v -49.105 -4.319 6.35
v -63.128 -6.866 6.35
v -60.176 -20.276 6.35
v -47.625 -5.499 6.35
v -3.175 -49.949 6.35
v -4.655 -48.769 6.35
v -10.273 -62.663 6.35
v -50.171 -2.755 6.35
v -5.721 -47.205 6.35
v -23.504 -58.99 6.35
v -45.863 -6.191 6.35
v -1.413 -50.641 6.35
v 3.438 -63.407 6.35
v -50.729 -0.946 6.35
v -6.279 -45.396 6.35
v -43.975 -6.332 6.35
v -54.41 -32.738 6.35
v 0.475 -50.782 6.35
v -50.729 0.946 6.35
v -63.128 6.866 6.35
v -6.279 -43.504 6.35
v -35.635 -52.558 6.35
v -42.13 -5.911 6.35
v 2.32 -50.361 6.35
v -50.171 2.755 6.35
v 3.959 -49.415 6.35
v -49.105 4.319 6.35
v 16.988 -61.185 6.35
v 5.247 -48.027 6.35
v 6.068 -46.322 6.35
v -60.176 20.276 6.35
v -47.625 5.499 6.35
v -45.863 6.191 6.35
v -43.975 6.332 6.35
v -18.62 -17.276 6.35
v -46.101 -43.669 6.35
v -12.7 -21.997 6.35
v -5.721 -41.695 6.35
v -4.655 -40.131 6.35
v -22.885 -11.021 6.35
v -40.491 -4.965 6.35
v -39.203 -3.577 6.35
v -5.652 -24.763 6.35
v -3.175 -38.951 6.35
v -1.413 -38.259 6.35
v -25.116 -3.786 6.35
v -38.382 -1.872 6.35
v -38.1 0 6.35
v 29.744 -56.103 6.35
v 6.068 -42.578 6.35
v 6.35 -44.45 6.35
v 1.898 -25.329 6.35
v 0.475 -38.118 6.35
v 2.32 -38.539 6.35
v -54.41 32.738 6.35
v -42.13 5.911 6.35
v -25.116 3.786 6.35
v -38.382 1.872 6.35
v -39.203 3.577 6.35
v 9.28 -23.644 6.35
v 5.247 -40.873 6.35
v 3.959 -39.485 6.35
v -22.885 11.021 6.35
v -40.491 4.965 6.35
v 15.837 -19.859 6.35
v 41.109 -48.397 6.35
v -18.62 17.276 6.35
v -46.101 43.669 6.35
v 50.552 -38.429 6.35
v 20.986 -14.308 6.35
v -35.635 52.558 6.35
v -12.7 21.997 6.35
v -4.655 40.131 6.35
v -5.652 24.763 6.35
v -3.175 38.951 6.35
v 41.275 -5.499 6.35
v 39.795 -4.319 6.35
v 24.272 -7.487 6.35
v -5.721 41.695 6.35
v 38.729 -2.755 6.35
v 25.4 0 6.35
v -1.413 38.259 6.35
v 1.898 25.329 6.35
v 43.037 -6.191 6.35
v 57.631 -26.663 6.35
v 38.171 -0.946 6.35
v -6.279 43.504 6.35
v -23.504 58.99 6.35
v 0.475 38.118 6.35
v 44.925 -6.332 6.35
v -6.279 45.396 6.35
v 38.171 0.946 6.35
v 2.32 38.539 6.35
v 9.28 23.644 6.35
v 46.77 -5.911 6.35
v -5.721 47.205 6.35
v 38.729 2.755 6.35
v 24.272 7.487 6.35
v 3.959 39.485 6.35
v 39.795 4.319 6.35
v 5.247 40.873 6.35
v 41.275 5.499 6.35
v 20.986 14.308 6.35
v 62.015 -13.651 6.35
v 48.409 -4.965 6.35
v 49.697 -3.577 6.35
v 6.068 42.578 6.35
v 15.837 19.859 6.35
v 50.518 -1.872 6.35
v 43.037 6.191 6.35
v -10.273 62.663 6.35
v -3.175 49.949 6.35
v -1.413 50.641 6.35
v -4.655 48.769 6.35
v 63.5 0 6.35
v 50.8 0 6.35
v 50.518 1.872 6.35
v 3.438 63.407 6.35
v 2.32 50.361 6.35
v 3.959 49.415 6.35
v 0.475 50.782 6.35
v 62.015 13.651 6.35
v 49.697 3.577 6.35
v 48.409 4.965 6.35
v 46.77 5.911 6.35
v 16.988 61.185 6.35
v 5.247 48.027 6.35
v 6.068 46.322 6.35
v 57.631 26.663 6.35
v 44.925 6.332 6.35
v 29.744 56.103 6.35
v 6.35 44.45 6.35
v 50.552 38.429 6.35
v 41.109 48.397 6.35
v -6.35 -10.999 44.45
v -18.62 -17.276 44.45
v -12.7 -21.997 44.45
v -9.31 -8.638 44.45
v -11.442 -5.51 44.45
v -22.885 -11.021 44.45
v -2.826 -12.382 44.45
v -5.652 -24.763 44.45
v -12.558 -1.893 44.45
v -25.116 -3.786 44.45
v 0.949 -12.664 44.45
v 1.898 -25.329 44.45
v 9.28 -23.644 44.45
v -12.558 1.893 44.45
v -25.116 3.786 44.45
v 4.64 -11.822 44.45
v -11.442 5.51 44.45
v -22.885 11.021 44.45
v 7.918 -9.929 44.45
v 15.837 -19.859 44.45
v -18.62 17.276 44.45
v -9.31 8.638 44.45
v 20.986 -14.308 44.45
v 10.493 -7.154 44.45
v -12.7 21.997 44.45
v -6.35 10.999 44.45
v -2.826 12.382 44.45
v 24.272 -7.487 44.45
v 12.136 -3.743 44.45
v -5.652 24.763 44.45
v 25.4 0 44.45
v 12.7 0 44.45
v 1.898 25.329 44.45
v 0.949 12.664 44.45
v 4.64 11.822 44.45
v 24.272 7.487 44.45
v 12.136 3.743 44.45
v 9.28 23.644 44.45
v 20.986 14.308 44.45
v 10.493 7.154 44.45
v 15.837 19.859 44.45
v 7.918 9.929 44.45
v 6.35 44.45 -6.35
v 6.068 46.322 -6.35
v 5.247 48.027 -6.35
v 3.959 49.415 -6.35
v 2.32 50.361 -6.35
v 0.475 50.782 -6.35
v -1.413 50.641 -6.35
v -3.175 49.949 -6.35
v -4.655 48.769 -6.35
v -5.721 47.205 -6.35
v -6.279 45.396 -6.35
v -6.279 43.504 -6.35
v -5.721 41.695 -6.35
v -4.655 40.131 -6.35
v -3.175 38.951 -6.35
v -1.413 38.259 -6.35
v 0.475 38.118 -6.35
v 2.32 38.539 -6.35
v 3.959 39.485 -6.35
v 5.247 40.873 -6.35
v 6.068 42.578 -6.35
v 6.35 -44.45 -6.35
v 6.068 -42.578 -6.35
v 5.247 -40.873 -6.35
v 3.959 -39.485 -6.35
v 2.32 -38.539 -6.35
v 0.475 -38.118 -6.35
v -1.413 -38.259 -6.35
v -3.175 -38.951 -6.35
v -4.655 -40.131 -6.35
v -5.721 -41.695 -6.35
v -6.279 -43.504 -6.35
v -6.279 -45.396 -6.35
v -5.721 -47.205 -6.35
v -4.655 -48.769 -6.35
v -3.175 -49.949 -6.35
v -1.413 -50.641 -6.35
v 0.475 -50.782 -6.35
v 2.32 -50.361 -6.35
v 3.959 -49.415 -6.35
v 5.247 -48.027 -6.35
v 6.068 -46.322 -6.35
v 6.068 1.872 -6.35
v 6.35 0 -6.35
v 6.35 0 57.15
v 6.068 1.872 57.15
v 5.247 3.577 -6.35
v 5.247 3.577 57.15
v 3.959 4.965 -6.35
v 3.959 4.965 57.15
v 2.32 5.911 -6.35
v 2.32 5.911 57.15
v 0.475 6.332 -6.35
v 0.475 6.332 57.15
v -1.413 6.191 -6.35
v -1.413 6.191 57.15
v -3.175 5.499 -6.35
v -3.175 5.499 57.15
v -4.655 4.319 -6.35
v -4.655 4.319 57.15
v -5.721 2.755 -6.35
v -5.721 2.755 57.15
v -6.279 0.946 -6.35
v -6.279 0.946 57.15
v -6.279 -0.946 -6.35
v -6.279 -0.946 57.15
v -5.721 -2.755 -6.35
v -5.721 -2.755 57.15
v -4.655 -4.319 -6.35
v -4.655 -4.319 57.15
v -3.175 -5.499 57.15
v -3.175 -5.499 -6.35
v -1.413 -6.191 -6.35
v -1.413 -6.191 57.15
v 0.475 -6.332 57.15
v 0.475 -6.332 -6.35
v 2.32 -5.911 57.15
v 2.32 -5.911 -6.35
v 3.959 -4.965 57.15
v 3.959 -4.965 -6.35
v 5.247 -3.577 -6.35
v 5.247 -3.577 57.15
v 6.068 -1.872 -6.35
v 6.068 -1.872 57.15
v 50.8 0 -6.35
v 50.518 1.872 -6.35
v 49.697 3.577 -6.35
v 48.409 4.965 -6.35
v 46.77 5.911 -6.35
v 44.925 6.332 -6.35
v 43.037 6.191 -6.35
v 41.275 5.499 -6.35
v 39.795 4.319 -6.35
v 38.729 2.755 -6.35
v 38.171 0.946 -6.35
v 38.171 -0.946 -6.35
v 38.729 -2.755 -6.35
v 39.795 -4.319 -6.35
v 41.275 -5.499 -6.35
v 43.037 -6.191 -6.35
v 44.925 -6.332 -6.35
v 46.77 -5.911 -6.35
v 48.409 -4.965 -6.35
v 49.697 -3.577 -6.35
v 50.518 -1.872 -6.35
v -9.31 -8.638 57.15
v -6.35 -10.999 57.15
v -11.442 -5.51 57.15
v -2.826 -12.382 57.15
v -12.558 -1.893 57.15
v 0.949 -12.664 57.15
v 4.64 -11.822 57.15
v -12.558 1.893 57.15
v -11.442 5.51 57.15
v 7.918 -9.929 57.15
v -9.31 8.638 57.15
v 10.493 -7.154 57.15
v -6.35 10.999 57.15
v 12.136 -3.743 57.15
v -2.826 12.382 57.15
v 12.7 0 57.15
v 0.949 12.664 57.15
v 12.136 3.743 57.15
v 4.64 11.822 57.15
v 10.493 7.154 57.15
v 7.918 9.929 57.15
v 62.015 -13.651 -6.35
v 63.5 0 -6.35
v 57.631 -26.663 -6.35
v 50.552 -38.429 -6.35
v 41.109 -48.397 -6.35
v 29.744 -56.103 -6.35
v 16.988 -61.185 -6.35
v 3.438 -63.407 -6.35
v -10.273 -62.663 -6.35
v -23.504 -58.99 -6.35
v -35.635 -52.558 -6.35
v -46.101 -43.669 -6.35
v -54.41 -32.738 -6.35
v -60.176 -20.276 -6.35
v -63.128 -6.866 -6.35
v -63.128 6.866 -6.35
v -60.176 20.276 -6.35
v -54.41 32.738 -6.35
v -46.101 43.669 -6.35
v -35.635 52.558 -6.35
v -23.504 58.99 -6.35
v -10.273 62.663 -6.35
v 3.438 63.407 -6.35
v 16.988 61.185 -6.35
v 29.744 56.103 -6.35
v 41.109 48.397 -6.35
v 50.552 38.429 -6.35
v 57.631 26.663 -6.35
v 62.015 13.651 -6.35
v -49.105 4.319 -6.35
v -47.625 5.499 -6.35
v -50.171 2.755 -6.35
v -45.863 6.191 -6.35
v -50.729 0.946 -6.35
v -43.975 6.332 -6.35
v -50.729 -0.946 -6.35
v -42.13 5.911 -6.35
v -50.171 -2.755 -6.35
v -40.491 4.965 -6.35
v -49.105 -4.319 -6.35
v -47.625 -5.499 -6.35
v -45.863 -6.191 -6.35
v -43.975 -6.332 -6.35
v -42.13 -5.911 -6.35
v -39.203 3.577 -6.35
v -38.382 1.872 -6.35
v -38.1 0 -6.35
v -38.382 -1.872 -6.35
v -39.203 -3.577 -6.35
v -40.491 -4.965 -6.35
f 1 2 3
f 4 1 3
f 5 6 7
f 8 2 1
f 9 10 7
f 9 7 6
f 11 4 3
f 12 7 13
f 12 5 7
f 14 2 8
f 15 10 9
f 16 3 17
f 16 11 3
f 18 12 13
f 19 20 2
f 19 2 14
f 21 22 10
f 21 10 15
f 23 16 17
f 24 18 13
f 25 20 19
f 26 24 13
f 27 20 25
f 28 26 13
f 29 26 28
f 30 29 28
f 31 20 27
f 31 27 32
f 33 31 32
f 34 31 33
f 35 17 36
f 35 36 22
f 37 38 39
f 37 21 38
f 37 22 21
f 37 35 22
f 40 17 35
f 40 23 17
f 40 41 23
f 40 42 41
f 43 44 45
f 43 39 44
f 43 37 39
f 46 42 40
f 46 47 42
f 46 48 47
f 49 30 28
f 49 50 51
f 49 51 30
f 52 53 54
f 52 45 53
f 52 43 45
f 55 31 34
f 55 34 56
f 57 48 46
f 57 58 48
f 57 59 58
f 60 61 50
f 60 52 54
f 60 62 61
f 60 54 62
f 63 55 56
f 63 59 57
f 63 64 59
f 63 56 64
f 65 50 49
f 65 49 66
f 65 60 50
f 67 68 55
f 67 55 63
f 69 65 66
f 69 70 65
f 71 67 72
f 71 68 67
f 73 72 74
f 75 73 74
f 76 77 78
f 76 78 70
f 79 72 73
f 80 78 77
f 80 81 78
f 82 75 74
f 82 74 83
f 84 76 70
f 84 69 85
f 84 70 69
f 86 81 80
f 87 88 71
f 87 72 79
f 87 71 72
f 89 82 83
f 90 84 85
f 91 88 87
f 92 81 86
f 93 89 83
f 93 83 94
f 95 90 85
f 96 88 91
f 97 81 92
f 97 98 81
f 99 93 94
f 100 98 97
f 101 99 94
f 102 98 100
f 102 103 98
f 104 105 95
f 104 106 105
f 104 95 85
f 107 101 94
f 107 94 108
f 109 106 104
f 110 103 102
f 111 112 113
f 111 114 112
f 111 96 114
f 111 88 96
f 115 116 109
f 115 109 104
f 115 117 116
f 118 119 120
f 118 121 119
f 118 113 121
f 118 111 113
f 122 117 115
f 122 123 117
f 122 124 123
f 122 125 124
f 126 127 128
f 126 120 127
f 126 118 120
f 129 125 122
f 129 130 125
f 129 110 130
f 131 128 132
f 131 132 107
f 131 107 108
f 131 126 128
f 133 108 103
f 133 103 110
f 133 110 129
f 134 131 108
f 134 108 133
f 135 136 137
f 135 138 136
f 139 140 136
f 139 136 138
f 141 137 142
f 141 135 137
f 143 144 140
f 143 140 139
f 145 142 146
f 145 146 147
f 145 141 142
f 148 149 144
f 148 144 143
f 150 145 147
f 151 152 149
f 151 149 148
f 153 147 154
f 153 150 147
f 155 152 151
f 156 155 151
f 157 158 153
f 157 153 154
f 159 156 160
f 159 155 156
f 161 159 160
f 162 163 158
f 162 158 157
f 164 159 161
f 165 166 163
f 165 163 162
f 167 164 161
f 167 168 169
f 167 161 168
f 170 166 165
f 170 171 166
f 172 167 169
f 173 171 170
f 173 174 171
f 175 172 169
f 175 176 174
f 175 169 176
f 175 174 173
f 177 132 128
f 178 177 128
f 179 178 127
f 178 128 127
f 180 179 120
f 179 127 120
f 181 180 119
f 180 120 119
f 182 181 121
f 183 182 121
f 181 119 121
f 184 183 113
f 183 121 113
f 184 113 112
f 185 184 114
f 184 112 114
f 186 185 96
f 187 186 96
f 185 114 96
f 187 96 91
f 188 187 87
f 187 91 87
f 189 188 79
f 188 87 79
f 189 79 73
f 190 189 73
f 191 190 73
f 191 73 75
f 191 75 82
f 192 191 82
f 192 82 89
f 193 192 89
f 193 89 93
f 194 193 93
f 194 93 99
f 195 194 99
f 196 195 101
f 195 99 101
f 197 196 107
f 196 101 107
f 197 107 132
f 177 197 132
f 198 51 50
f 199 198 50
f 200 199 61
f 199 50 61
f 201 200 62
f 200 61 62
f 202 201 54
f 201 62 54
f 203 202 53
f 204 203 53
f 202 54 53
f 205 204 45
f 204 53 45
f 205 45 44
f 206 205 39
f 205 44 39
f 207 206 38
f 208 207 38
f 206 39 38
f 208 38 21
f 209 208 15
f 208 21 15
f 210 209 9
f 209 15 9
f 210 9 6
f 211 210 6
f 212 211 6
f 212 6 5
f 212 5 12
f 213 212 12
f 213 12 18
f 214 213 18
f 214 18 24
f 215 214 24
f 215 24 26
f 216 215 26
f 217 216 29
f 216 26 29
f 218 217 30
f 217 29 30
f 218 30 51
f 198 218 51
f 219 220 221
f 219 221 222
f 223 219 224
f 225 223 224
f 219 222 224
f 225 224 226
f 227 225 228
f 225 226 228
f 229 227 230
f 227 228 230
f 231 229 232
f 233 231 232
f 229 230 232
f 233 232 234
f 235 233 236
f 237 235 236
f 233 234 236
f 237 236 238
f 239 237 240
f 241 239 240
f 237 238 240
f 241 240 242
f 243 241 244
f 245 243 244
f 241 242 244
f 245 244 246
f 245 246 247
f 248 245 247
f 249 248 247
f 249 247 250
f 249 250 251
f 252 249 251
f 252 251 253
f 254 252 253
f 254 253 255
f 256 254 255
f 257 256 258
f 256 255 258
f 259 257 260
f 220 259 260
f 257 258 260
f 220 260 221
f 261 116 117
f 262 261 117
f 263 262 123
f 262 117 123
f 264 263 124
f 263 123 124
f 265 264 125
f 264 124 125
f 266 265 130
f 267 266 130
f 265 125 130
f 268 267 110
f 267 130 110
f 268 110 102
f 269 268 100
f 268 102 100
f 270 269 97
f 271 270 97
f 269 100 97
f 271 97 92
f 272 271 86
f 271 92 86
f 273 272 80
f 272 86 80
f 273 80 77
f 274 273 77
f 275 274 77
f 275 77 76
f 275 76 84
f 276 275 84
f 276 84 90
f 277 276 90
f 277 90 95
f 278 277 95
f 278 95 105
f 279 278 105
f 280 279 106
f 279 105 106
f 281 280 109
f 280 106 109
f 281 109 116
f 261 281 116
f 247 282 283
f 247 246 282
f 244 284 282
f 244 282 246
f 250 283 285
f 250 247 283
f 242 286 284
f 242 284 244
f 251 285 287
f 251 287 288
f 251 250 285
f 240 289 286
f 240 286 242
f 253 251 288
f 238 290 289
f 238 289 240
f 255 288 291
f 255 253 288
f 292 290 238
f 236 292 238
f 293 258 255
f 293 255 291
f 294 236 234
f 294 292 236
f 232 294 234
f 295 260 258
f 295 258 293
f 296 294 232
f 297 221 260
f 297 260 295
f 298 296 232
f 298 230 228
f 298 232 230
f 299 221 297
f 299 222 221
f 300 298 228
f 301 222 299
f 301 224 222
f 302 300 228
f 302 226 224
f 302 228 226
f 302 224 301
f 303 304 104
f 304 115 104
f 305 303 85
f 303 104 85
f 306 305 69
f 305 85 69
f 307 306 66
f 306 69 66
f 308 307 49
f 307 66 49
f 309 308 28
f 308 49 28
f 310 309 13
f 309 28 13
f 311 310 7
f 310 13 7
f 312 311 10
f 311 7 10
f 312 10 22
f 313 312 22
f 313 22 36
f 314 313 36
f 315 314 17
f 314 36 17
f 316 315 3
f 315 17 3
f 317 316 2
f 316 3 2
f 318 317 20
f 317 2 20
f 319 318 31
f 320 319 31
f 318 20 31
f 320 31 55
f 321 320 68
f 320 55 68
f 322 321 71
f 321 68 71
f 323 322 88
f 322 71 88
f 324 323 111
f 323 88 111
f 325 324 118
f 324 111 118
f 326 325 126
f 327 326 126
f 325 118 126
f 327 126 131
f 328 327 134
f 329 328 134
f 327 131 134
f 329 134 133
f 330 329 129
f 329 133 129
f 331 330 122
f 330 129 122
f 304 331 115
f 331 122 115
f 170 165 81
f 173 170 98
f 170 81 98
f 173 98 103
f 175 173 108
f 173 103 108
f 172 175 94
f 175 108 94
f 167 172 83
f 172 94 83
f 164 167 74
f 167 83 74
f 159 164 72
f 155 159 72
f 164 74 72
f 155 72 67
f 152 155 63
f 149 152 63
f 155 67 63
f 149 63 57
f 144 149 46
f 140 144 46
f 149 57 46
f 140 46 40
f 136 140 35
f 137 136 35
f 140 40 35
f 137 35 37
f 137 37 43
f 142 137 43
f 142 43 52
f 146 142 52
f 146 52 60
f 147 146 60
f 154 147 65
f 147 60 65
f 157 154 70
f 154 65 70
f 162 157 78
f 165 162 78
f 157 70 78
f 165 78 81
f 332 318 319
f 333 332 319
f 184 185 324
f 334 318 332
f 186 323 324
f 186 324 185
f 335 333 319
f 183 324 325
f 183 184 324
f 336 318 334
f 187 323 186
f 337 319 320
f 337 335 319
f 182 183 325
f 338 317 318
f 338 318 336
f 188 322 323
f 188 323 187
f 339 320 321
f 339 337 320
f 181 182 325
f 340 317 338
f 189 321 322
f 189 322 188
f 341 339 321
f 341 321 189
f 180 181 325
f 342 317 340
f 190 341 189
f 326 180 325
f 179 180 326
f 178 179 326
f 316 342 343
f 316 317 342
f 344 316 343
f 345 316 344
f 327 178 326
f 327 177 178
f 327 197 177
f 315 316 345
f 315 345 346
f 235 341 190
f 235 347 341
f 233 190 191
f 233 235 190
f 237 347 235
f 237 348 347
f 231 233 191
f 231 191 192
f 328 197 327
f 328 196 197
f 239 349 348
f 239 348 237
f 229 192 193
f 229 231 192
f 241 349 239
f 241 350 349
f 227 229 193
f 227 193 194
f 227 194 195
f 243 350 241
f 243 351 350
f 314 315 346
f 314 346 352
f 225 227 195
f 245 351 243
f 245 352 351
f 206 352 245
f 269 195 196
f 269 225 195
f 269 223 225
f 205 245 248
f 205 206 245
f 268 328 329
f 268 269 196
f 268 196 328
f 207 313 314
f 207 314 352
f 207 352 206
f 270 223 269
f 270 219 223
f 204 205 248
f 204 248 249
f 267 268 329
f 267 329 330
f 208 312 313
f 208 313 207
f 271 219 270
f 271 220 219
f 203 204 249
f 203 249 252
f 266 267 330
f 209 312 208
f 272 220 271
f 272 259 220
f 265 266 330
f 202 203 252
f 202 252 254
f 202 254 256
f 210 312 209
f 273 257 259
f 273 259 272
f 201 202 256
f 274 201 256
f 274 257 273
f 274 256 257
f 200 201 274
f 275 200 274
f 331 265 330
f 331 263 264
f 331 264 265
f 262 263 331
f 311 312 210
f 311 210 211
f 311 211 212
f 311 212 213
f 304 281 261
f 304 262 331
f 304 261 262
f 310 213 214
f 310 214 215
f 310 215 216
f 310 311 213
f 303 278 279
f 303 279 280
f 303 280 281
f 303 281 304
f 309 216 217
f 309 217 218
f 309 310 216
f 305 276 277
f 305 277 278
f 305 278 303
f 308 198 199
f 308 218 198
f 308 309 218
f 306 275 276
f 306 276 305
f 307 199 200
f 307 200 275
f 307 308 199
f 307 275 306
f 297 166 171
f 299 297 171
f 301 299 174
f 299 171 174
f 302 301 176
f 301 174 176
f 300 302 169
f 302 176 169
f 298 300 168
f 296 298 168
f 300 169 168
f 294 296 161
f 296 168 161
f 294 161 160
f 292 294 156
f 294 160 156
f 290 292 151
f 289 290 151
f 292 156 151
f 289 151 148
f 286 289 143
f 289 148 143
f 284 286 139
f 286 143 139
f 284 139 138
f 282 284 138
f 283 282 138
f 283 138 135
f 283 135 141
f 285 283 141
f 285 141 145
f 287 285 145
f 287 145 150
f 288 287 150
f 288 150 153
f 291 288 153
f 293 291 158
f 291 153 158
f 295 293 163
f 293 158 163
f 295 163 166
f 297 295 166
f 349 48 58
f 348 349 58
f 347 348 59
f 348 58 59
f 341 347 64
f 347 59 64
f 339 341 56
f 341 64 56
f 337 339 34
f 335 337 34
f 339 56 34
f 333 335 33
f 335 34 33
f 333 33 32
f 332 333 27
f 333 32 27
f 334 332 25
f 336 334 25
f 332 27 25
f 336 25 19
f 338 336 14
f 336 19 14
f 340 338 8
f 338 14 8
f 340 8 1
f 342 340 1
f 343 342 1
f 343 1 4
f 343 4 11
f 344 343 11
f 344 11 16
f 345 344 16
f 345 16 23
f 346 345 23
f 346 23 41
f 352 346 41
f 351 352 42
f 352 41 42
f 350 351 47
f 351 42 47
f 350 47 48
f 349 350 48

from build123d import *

# Parameters (mm, degrees)
F0_R      = 63.5
F1_DEPTH  = 6.35
F1_FACE_R = 63.5
F2_DEPTH  = 6.35
F3_R      = 6.35
F4_DEPTH  = 12.7
F3_R_2    = 25.4
F5_DEPTH  = 38.1
F6_R      = 12.7
F7_DEPTH  = 12.7
F8_R      = 6.35
F9_DEPTH  = 63.5


with BuildPart() as f1:
    # F0 (on Top) → F1 (new body)
    with BuildSketch(Plane.XY):
        Circle(F0_R)
    extrude(amount=F1_DEPTH)

    # F1_face (on face) → F2 (join)
    with BuildSketch(Plane(origin=(0, 0, 0), x_dir=(1, 0, 0), z_dir=(0, 0, -1))):
        Circle(F1_FACE_R)
    extrude(amount=F2_DEPTH)

    # F3 (on face) → F4 (cut)
    with BuildSketch(Plane.XY.offset(6.35)):
        with Locations((-44.45, 0)):
            Circle(F3_R)
        with Locations((0, 44.45)):
            Circle(F3_R)
        with Locations((44.45, 0)):
            Circle(F3_R)
        with Locations((0, -44.45)):
            Circle(F3_R)
    extrude(amount=-F4_DEPTH, mode=Mode.SUBTRACT)

    # F3 (on face) → F5 (join)
    with BuildSketch(Plane.XY.offset(6.35)):
        Circle(F3_R_2)
    extrude(amount=F5_DEPTH)

    # F6 (on face) → F7 (join)
    with BuildSketch(Plane.XY.offset(44.45)):
        Circle(F6_R)
    extrude(amount=F7_DEPTH)

    # F8 (on face) → F9 (cut)
    with BuildSketch(Plane.XY.offset(57.15)):
        Circle(F8_R)
    extrude(amount=-F9_DEPTH, mode=Mode.SUBTRACT)


solid = f1.part
